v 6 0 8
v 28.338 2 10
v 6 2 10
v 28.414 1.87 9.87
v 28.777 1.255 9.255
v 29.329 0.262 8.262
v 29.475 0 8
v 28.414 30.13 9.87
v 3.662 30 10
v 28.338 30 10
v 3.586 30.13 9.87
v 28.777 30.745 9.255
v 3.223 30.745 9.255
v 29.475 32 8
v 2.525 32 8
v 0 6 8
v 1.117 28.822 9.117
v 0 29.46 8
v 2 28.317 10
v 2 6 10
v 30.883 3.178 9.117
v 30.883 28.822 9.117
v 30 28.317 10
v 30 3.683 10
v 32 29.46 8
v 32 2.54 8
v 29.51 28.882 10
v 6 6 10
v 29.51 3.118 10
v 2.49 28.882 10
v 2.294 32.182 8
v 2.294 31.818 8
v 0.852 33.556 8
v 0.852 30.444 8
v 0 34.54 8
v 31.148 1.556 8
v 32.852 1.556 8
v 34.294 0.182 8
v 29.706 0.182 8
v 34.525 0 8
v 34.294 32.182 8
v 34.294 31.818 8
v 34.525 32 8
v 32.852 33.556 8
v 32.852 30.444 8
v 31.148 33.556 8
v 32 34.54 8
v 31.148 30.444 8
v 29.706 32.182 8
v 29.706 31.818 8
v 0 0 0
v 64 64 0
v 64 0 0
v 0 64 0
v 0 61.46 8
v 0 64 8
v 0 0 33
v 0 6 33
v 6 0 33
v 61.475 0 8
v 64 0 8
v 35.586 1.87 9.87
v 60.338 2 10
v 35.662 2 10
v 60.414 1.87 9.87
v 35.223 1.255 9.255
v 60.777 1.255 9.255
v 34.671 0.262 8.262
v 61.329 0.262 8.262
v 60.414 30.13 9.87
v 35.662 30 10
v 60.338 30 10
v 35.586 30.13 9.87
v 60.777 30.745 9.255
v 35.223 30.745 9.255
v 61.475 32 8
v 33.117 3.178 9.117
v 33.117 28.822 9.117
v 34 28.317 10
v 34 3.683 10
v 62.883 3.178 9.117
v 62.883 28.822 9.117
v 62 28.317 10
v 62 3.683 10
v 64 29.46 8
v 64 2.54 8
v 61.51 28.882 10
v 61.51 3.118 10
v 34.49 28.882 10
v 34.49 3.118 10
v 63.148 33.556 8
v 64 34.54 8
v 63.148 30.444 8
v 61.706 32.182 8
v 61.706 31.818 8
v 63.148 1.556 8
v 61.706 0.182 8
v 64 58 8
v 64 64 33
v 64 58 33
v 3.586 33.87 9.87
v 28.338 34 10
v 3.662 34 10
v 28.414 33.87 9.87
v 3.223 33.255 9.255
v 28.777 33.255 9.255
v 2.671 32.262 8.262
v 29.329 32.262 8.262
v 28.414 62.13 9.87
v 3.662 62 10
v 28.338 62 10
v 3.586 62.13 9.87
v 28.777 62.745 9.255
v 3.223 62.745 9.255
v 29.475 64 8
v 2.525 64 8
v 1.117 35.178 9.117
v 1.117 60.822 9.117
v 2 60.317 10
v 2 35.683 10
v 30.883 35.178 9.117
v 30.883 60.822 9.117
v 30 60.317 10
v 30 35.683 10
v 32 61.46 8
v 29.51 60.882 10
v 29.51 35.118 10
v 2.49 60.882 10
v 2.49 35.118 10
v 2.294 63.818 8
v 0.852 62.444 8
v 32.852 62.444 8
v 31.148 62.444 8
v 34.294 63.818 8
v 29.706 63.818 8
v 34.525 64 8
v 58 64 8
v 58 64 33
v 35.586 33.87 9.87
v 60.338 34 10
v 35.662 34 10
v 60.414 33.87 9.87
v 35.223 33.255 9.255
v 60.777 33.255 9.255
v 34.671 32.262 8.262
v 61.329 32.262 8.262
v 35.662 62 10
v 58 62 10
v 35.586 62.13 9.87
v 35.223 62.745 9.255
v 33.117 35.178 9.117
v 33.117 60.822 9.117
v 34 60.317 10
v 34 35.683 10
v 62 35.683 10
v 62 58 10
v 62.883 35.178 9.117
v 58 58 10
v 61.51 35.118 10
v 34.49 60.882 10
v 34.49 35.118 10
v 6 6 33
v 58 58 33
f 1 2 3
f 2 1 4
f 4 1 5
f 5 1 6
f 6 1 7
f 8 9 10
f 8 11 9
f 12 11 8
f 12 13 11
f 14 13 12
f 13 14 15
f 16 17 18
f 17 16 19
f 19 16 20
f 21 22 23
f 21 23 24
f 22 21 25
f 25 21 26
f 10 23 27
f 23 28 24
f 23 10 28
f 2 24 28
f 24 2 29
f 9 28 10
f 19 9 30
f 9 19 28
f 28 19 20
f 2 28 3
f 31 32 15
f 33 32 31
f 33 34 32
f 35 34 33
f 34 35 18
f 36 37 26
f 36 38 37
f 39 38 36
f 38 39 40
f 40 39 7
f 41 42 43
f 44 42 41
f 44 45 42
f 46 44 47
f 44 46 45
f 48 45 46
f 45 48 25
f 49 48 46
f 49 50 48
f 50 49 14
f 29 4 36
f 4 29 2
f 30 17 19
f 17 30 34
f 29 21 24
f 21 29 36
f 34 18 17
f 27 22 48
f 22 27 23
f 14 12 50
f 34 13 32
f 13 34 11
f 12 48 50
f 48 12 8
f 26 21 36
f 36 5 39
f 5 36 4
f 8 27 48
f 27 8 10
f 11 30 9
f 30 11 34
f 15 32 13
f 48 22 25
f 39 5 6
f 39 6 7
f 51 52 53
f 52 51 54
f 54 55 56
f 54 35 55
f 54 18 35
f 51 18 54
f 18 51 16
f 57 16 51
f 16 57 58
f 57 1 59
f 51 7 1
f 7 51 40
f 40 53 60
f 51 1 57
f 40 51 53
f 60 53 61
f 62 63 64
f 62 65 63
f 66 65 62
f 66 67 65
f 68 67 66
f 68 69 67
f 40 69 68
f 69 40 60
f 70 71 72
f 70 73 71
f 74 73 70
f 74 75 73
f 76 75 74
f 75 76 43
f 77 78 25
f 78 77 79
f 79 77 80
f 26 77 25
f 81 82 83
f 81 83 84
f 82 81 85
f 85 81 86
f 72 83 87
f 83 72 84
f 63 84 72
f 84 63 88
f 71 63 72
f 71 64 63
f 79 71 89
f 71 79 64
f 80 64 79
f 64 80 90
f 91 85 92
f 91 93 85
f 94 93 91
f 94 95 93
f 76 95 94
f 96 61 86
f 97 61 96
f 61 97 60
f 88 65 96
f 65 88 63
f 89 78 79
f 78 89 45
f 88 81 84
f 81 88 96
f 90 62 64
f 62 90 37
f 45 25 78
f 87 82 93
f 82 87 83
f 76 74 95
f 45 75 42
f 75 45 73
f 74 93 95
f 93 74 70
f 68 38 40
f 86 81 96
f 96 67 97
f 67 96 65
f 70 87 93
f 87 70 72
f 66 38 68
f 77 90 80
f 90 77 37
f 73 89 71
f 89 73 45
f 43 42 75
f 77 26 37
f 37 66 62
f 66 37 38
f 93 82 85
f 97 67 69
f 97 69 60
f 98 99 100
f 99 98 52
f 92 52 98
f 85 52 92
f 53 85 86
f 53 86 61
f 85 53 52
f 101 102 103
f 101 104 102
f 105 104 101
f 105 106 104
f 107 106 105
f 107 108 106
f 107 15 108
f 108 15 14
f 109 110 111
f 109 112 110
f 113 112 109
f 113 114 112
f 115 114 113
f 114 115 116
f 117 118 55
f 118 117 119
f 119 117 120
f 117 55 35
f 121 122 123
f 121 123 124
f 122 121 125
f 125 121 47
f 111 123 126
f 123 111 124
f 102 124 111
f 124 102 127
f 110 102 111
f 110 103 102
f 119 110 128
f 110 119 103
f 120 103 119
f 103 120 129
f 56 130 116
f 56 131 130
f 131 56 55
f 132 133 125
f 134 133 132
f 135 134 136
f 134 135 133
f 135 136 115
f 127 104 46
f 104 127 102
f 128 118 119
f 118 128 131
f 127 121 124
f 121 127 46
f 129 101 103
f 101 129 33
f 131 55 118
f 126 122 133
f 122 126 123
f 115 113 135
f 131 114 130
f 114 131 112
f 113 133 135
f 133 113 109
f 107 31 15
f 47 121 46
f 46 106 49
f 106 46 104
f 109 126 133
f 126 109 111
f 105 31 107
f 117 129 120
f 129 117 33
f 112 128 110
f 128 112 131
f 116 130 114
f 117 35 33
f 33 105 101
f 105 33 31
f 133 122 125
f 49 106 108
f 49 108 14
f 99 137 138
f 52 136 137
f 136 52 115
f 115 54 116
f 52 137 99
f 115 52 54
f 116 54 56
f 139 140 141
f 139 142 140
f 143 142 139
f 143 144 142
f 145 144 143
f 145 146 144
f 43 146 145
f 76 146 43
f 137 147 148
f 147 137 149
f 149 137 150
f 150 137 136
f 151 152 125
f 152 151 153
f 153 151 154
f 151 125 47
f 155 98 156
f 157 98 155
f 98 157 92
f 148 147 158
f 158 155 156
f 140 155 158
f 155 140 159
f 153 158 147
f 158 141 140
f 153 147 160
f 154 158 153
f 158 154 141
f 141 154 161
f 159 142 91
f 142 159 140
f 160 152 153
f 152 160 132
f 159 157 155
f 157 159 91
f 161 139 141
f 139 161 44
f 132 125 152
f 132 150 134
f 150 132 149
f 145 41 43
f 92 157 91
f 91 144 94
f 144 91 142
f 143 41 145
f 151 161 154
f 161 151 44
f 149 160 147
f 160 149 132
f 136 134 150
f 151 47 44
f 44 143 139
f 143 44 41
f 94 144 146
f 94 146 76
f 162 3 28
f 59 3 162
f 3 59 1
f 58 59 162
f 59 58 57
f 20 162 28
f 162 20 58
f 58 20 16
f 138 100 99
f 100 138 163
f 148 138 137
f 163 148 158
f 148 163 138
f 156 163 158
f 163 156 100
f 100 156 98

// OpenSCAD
// file: ModularDungeonTileLibrary.scad
//Constants
wallleft = 0;
wallbottom = 1;
wallright = 2;
walltop = 3;
wallcenter = 4;
walldoubleright = 5;


//Variables
size = 32;
connectorlength = size-10;
connectorwidth = 6;
connectorheight = 4;
baseheight = 8;
topperheight = 2;
topperrounded = true;
walllength = size;
wallheight = 25;
wallwidth = 6;
wallwidththin = 4;


//Functions
function hypotenuse_ra(side_a, side_b) =
    sqrt(pow(side_a, 2) + pow(side_b, 2));
    
    
//Modules    
module mtdl_Base_Connector(cw,cl,ch) {
    translate([-connectorwidth/2,-connectorlength/2,-connectorheight/2]) {
        cube([cw,cl,ch/2]);
        translate([cw/3,0,ch/2])
            cube([cw/3,cl,ch/2]);
        translate([-(cw-2)/2,cl/2-2,0])
            cube([cw+4,4,ch]);
    }
}

module mdtl_Base(s,bh)
{
    cube([s,s,bh]);
}

module mdtl_Topper(s,bh,th,tr)
{
    if (tr) {
        translate([0,0,bh])
            intersection() {
                difference () {
                        cube([s,s,th]);
                        union () {
                        rotate(a=45, v=[1,0,0])
                            cube([s,th*2,th*2]);
                        translate([0,s,0])
                            rotate(a=45, v=[1,0,0])
                                cube([s,th*2,th*2]);
                        rotate(a=-45, v=[0,1,0])
                            cube([th*2,s,th*2]);
                        translate([s,0,0])
                            rotate(a=-45, v=[0,1,0])
                                cube([th*2,s,th*2]);
                        }
                }
                translate([s/2,s/2,0])
                    cylinder(
                        h=th, 
                        r1=hypotenuse_ra(s/2-1.2, s/2-1.2), 
                        r2=hypotenuse_ra(s/2-th-.8, s/2-th-.8), 
                        center=false, 
                        $fa=.1);
            }    
    }
    else {
        translate([0,0,bh])
            difference() {
                cube([s,s,th]);
                union () {
                rotate(a=45, v=[1,0,0])
                    cube([s,th*2,th*2]);
                translate([0,s,0])
                    rotate(a=45, v=[1,0,0])
                        cube([s,th*2,th*2]);
                rotate(a=-45, v=[0,1,0])
                    cube([th*2,s,th*2]);
                translate([s,0,0])
                    rotate(a=-45, v=[0,1,0])
                        cube([th*2,s,th*2]);
                }
            }    
    }
}

module mdtl_Base_1x1(s,bh,th,tr) 
{
    difference () {
        union () {
            mdtl_Base(s,bh);
            mdtl_Topper(s,bh,th,tr);
        }
//        union () {
//            translate([size/2,size,baseheight/2])
//                rotate([0,180,0])
//                    mtdl_Base_Connector(connectorwidth,connectorlength,connectorheight);
//            translate([size/2,0,baseheight/2])
//                rotate([0,180,0])
//                    mtdl_Base_Connector(connectorwidth,connectorlength,connectorheight);
//            translate([size,size/2,baseheight/2])
//                rotate([0,180,90])
//                    mtdl_Base_Connector(connectorwidth,connectorlength,connectorheight);
//            translate([0,size/2,baseheight/2])
//                rotate([0,180,90])
//                    mtdl_Base_Connector(connectorwidth,connectorlength,connectorheight);
//        }
    }
}

module mdtl_Base_1x2(s,bh,th,tr)
{
    union () {
        mdtl_Base_1x1(s,bh,th,tr);
        translate([s,0,0])
            mdtl_Base_1x1(s,bh,th,tr);
    }
}
 
module mdtl_Base_2x2(s,bh,th,tr)
{
    union () {
        mdtl_Base_1x2(s,bh,th,tr);
        translate([0,s,0])
            mdtl_Base_1x2(s,bh,th,tr);
    }
}
 
module mdtl_Base_2x4(s,bh,th,tr)
{
    union () {
        mdtl_Base_2x2(s,bh,th,tr);
        translate([s*2,0,0])
            mdtl_Base_2x2(s,bh,th,tr);
    }
}
 
module mdtl_Base_4x4(s,bh,th,tr)
{
    union () {
        mdtl_Base_2x4(s,bh,th,tr);
        translate([0,s*2,0])
            mdtl_Base_2x4(s,bh,th,tr);
    }
}
 
module mdtl_Wall_1(w,l,h)
{
    translate([0,0,baseheight])
        cube([w,l,h]);   
}

module mdtl_Wall_1_Position(w,l,h,p)
{
    if (p==0) {
        mdtl_Wall_1(w,l,h);
    }
    
    else if (p==1) {
        rotate(a=-90)
           translate([-w,0,0])
               mdtl_Wall_1(w,l,h);       
    }
    
    else if (p==2) {
        translate([(size)-w,0,0])
            mdtl_Wall_1(w,l,h);
    }
    
    else if (p==3) {
        rotate(a=-90)
            translate([-l,0,0])
                mdtl_Wall_1(w,l,h);
    }
    
    else if (p==4) {
        translate([(size)-w/2,0,0])
            mdtl_Wall_1(w,l,h);
    }
    
    else if (p==5) {
        translate([(size*2)-w,0,0])
           mdtl_Wall_1(w,l,h);       
    }
}

module mdtl_Wall_2(w,l,h)
{
    union() {
        mdtl_Wall_1(w,l,h);
        translate([0,l,0])
            mdtl_Wall_1(w,l,h);
    }
}

module mdtl_Wall_2_Position(w,l,h,p)
{
    if (p==0) {
        mdtl_Wall_2(w,l,h);
    }
    
    else if (p==1) {
        rotate(a=-90)
            translate([-w,0,0])
                mdtl_Wall_2(w,l,h);
    }
    
    else if (p==2) {
    translate([(size*2)-w,0,0])
        mdtl_Wall_2(w,l,h);
    }
    
    else if (p==3) {
        rotate(a=-90)
            translate([-l*2,0,0])
                mdtl_Wall_2(w,l,h);
    }
    
    else if (p==4) {
        translate([(size)-w/2,0,0])
            mdtl_Wall_2(w,l,h);
    }
}
// main file
include <ModularDungeonTileLibrary.scad>; 

mdtl_Base_2x2(size,baseheight,topperheight,topperrounded);
//Create Pillar with modified wall
mdtl_Wall_2_Position(wallwidth,wallwidth/2,wallheight,wallleft);
translate([0,walllength*2-wallwidth,0])
    mdtl_Wall_2_Position(wallwidth,wallwidth/2,wallheight,wallright);
